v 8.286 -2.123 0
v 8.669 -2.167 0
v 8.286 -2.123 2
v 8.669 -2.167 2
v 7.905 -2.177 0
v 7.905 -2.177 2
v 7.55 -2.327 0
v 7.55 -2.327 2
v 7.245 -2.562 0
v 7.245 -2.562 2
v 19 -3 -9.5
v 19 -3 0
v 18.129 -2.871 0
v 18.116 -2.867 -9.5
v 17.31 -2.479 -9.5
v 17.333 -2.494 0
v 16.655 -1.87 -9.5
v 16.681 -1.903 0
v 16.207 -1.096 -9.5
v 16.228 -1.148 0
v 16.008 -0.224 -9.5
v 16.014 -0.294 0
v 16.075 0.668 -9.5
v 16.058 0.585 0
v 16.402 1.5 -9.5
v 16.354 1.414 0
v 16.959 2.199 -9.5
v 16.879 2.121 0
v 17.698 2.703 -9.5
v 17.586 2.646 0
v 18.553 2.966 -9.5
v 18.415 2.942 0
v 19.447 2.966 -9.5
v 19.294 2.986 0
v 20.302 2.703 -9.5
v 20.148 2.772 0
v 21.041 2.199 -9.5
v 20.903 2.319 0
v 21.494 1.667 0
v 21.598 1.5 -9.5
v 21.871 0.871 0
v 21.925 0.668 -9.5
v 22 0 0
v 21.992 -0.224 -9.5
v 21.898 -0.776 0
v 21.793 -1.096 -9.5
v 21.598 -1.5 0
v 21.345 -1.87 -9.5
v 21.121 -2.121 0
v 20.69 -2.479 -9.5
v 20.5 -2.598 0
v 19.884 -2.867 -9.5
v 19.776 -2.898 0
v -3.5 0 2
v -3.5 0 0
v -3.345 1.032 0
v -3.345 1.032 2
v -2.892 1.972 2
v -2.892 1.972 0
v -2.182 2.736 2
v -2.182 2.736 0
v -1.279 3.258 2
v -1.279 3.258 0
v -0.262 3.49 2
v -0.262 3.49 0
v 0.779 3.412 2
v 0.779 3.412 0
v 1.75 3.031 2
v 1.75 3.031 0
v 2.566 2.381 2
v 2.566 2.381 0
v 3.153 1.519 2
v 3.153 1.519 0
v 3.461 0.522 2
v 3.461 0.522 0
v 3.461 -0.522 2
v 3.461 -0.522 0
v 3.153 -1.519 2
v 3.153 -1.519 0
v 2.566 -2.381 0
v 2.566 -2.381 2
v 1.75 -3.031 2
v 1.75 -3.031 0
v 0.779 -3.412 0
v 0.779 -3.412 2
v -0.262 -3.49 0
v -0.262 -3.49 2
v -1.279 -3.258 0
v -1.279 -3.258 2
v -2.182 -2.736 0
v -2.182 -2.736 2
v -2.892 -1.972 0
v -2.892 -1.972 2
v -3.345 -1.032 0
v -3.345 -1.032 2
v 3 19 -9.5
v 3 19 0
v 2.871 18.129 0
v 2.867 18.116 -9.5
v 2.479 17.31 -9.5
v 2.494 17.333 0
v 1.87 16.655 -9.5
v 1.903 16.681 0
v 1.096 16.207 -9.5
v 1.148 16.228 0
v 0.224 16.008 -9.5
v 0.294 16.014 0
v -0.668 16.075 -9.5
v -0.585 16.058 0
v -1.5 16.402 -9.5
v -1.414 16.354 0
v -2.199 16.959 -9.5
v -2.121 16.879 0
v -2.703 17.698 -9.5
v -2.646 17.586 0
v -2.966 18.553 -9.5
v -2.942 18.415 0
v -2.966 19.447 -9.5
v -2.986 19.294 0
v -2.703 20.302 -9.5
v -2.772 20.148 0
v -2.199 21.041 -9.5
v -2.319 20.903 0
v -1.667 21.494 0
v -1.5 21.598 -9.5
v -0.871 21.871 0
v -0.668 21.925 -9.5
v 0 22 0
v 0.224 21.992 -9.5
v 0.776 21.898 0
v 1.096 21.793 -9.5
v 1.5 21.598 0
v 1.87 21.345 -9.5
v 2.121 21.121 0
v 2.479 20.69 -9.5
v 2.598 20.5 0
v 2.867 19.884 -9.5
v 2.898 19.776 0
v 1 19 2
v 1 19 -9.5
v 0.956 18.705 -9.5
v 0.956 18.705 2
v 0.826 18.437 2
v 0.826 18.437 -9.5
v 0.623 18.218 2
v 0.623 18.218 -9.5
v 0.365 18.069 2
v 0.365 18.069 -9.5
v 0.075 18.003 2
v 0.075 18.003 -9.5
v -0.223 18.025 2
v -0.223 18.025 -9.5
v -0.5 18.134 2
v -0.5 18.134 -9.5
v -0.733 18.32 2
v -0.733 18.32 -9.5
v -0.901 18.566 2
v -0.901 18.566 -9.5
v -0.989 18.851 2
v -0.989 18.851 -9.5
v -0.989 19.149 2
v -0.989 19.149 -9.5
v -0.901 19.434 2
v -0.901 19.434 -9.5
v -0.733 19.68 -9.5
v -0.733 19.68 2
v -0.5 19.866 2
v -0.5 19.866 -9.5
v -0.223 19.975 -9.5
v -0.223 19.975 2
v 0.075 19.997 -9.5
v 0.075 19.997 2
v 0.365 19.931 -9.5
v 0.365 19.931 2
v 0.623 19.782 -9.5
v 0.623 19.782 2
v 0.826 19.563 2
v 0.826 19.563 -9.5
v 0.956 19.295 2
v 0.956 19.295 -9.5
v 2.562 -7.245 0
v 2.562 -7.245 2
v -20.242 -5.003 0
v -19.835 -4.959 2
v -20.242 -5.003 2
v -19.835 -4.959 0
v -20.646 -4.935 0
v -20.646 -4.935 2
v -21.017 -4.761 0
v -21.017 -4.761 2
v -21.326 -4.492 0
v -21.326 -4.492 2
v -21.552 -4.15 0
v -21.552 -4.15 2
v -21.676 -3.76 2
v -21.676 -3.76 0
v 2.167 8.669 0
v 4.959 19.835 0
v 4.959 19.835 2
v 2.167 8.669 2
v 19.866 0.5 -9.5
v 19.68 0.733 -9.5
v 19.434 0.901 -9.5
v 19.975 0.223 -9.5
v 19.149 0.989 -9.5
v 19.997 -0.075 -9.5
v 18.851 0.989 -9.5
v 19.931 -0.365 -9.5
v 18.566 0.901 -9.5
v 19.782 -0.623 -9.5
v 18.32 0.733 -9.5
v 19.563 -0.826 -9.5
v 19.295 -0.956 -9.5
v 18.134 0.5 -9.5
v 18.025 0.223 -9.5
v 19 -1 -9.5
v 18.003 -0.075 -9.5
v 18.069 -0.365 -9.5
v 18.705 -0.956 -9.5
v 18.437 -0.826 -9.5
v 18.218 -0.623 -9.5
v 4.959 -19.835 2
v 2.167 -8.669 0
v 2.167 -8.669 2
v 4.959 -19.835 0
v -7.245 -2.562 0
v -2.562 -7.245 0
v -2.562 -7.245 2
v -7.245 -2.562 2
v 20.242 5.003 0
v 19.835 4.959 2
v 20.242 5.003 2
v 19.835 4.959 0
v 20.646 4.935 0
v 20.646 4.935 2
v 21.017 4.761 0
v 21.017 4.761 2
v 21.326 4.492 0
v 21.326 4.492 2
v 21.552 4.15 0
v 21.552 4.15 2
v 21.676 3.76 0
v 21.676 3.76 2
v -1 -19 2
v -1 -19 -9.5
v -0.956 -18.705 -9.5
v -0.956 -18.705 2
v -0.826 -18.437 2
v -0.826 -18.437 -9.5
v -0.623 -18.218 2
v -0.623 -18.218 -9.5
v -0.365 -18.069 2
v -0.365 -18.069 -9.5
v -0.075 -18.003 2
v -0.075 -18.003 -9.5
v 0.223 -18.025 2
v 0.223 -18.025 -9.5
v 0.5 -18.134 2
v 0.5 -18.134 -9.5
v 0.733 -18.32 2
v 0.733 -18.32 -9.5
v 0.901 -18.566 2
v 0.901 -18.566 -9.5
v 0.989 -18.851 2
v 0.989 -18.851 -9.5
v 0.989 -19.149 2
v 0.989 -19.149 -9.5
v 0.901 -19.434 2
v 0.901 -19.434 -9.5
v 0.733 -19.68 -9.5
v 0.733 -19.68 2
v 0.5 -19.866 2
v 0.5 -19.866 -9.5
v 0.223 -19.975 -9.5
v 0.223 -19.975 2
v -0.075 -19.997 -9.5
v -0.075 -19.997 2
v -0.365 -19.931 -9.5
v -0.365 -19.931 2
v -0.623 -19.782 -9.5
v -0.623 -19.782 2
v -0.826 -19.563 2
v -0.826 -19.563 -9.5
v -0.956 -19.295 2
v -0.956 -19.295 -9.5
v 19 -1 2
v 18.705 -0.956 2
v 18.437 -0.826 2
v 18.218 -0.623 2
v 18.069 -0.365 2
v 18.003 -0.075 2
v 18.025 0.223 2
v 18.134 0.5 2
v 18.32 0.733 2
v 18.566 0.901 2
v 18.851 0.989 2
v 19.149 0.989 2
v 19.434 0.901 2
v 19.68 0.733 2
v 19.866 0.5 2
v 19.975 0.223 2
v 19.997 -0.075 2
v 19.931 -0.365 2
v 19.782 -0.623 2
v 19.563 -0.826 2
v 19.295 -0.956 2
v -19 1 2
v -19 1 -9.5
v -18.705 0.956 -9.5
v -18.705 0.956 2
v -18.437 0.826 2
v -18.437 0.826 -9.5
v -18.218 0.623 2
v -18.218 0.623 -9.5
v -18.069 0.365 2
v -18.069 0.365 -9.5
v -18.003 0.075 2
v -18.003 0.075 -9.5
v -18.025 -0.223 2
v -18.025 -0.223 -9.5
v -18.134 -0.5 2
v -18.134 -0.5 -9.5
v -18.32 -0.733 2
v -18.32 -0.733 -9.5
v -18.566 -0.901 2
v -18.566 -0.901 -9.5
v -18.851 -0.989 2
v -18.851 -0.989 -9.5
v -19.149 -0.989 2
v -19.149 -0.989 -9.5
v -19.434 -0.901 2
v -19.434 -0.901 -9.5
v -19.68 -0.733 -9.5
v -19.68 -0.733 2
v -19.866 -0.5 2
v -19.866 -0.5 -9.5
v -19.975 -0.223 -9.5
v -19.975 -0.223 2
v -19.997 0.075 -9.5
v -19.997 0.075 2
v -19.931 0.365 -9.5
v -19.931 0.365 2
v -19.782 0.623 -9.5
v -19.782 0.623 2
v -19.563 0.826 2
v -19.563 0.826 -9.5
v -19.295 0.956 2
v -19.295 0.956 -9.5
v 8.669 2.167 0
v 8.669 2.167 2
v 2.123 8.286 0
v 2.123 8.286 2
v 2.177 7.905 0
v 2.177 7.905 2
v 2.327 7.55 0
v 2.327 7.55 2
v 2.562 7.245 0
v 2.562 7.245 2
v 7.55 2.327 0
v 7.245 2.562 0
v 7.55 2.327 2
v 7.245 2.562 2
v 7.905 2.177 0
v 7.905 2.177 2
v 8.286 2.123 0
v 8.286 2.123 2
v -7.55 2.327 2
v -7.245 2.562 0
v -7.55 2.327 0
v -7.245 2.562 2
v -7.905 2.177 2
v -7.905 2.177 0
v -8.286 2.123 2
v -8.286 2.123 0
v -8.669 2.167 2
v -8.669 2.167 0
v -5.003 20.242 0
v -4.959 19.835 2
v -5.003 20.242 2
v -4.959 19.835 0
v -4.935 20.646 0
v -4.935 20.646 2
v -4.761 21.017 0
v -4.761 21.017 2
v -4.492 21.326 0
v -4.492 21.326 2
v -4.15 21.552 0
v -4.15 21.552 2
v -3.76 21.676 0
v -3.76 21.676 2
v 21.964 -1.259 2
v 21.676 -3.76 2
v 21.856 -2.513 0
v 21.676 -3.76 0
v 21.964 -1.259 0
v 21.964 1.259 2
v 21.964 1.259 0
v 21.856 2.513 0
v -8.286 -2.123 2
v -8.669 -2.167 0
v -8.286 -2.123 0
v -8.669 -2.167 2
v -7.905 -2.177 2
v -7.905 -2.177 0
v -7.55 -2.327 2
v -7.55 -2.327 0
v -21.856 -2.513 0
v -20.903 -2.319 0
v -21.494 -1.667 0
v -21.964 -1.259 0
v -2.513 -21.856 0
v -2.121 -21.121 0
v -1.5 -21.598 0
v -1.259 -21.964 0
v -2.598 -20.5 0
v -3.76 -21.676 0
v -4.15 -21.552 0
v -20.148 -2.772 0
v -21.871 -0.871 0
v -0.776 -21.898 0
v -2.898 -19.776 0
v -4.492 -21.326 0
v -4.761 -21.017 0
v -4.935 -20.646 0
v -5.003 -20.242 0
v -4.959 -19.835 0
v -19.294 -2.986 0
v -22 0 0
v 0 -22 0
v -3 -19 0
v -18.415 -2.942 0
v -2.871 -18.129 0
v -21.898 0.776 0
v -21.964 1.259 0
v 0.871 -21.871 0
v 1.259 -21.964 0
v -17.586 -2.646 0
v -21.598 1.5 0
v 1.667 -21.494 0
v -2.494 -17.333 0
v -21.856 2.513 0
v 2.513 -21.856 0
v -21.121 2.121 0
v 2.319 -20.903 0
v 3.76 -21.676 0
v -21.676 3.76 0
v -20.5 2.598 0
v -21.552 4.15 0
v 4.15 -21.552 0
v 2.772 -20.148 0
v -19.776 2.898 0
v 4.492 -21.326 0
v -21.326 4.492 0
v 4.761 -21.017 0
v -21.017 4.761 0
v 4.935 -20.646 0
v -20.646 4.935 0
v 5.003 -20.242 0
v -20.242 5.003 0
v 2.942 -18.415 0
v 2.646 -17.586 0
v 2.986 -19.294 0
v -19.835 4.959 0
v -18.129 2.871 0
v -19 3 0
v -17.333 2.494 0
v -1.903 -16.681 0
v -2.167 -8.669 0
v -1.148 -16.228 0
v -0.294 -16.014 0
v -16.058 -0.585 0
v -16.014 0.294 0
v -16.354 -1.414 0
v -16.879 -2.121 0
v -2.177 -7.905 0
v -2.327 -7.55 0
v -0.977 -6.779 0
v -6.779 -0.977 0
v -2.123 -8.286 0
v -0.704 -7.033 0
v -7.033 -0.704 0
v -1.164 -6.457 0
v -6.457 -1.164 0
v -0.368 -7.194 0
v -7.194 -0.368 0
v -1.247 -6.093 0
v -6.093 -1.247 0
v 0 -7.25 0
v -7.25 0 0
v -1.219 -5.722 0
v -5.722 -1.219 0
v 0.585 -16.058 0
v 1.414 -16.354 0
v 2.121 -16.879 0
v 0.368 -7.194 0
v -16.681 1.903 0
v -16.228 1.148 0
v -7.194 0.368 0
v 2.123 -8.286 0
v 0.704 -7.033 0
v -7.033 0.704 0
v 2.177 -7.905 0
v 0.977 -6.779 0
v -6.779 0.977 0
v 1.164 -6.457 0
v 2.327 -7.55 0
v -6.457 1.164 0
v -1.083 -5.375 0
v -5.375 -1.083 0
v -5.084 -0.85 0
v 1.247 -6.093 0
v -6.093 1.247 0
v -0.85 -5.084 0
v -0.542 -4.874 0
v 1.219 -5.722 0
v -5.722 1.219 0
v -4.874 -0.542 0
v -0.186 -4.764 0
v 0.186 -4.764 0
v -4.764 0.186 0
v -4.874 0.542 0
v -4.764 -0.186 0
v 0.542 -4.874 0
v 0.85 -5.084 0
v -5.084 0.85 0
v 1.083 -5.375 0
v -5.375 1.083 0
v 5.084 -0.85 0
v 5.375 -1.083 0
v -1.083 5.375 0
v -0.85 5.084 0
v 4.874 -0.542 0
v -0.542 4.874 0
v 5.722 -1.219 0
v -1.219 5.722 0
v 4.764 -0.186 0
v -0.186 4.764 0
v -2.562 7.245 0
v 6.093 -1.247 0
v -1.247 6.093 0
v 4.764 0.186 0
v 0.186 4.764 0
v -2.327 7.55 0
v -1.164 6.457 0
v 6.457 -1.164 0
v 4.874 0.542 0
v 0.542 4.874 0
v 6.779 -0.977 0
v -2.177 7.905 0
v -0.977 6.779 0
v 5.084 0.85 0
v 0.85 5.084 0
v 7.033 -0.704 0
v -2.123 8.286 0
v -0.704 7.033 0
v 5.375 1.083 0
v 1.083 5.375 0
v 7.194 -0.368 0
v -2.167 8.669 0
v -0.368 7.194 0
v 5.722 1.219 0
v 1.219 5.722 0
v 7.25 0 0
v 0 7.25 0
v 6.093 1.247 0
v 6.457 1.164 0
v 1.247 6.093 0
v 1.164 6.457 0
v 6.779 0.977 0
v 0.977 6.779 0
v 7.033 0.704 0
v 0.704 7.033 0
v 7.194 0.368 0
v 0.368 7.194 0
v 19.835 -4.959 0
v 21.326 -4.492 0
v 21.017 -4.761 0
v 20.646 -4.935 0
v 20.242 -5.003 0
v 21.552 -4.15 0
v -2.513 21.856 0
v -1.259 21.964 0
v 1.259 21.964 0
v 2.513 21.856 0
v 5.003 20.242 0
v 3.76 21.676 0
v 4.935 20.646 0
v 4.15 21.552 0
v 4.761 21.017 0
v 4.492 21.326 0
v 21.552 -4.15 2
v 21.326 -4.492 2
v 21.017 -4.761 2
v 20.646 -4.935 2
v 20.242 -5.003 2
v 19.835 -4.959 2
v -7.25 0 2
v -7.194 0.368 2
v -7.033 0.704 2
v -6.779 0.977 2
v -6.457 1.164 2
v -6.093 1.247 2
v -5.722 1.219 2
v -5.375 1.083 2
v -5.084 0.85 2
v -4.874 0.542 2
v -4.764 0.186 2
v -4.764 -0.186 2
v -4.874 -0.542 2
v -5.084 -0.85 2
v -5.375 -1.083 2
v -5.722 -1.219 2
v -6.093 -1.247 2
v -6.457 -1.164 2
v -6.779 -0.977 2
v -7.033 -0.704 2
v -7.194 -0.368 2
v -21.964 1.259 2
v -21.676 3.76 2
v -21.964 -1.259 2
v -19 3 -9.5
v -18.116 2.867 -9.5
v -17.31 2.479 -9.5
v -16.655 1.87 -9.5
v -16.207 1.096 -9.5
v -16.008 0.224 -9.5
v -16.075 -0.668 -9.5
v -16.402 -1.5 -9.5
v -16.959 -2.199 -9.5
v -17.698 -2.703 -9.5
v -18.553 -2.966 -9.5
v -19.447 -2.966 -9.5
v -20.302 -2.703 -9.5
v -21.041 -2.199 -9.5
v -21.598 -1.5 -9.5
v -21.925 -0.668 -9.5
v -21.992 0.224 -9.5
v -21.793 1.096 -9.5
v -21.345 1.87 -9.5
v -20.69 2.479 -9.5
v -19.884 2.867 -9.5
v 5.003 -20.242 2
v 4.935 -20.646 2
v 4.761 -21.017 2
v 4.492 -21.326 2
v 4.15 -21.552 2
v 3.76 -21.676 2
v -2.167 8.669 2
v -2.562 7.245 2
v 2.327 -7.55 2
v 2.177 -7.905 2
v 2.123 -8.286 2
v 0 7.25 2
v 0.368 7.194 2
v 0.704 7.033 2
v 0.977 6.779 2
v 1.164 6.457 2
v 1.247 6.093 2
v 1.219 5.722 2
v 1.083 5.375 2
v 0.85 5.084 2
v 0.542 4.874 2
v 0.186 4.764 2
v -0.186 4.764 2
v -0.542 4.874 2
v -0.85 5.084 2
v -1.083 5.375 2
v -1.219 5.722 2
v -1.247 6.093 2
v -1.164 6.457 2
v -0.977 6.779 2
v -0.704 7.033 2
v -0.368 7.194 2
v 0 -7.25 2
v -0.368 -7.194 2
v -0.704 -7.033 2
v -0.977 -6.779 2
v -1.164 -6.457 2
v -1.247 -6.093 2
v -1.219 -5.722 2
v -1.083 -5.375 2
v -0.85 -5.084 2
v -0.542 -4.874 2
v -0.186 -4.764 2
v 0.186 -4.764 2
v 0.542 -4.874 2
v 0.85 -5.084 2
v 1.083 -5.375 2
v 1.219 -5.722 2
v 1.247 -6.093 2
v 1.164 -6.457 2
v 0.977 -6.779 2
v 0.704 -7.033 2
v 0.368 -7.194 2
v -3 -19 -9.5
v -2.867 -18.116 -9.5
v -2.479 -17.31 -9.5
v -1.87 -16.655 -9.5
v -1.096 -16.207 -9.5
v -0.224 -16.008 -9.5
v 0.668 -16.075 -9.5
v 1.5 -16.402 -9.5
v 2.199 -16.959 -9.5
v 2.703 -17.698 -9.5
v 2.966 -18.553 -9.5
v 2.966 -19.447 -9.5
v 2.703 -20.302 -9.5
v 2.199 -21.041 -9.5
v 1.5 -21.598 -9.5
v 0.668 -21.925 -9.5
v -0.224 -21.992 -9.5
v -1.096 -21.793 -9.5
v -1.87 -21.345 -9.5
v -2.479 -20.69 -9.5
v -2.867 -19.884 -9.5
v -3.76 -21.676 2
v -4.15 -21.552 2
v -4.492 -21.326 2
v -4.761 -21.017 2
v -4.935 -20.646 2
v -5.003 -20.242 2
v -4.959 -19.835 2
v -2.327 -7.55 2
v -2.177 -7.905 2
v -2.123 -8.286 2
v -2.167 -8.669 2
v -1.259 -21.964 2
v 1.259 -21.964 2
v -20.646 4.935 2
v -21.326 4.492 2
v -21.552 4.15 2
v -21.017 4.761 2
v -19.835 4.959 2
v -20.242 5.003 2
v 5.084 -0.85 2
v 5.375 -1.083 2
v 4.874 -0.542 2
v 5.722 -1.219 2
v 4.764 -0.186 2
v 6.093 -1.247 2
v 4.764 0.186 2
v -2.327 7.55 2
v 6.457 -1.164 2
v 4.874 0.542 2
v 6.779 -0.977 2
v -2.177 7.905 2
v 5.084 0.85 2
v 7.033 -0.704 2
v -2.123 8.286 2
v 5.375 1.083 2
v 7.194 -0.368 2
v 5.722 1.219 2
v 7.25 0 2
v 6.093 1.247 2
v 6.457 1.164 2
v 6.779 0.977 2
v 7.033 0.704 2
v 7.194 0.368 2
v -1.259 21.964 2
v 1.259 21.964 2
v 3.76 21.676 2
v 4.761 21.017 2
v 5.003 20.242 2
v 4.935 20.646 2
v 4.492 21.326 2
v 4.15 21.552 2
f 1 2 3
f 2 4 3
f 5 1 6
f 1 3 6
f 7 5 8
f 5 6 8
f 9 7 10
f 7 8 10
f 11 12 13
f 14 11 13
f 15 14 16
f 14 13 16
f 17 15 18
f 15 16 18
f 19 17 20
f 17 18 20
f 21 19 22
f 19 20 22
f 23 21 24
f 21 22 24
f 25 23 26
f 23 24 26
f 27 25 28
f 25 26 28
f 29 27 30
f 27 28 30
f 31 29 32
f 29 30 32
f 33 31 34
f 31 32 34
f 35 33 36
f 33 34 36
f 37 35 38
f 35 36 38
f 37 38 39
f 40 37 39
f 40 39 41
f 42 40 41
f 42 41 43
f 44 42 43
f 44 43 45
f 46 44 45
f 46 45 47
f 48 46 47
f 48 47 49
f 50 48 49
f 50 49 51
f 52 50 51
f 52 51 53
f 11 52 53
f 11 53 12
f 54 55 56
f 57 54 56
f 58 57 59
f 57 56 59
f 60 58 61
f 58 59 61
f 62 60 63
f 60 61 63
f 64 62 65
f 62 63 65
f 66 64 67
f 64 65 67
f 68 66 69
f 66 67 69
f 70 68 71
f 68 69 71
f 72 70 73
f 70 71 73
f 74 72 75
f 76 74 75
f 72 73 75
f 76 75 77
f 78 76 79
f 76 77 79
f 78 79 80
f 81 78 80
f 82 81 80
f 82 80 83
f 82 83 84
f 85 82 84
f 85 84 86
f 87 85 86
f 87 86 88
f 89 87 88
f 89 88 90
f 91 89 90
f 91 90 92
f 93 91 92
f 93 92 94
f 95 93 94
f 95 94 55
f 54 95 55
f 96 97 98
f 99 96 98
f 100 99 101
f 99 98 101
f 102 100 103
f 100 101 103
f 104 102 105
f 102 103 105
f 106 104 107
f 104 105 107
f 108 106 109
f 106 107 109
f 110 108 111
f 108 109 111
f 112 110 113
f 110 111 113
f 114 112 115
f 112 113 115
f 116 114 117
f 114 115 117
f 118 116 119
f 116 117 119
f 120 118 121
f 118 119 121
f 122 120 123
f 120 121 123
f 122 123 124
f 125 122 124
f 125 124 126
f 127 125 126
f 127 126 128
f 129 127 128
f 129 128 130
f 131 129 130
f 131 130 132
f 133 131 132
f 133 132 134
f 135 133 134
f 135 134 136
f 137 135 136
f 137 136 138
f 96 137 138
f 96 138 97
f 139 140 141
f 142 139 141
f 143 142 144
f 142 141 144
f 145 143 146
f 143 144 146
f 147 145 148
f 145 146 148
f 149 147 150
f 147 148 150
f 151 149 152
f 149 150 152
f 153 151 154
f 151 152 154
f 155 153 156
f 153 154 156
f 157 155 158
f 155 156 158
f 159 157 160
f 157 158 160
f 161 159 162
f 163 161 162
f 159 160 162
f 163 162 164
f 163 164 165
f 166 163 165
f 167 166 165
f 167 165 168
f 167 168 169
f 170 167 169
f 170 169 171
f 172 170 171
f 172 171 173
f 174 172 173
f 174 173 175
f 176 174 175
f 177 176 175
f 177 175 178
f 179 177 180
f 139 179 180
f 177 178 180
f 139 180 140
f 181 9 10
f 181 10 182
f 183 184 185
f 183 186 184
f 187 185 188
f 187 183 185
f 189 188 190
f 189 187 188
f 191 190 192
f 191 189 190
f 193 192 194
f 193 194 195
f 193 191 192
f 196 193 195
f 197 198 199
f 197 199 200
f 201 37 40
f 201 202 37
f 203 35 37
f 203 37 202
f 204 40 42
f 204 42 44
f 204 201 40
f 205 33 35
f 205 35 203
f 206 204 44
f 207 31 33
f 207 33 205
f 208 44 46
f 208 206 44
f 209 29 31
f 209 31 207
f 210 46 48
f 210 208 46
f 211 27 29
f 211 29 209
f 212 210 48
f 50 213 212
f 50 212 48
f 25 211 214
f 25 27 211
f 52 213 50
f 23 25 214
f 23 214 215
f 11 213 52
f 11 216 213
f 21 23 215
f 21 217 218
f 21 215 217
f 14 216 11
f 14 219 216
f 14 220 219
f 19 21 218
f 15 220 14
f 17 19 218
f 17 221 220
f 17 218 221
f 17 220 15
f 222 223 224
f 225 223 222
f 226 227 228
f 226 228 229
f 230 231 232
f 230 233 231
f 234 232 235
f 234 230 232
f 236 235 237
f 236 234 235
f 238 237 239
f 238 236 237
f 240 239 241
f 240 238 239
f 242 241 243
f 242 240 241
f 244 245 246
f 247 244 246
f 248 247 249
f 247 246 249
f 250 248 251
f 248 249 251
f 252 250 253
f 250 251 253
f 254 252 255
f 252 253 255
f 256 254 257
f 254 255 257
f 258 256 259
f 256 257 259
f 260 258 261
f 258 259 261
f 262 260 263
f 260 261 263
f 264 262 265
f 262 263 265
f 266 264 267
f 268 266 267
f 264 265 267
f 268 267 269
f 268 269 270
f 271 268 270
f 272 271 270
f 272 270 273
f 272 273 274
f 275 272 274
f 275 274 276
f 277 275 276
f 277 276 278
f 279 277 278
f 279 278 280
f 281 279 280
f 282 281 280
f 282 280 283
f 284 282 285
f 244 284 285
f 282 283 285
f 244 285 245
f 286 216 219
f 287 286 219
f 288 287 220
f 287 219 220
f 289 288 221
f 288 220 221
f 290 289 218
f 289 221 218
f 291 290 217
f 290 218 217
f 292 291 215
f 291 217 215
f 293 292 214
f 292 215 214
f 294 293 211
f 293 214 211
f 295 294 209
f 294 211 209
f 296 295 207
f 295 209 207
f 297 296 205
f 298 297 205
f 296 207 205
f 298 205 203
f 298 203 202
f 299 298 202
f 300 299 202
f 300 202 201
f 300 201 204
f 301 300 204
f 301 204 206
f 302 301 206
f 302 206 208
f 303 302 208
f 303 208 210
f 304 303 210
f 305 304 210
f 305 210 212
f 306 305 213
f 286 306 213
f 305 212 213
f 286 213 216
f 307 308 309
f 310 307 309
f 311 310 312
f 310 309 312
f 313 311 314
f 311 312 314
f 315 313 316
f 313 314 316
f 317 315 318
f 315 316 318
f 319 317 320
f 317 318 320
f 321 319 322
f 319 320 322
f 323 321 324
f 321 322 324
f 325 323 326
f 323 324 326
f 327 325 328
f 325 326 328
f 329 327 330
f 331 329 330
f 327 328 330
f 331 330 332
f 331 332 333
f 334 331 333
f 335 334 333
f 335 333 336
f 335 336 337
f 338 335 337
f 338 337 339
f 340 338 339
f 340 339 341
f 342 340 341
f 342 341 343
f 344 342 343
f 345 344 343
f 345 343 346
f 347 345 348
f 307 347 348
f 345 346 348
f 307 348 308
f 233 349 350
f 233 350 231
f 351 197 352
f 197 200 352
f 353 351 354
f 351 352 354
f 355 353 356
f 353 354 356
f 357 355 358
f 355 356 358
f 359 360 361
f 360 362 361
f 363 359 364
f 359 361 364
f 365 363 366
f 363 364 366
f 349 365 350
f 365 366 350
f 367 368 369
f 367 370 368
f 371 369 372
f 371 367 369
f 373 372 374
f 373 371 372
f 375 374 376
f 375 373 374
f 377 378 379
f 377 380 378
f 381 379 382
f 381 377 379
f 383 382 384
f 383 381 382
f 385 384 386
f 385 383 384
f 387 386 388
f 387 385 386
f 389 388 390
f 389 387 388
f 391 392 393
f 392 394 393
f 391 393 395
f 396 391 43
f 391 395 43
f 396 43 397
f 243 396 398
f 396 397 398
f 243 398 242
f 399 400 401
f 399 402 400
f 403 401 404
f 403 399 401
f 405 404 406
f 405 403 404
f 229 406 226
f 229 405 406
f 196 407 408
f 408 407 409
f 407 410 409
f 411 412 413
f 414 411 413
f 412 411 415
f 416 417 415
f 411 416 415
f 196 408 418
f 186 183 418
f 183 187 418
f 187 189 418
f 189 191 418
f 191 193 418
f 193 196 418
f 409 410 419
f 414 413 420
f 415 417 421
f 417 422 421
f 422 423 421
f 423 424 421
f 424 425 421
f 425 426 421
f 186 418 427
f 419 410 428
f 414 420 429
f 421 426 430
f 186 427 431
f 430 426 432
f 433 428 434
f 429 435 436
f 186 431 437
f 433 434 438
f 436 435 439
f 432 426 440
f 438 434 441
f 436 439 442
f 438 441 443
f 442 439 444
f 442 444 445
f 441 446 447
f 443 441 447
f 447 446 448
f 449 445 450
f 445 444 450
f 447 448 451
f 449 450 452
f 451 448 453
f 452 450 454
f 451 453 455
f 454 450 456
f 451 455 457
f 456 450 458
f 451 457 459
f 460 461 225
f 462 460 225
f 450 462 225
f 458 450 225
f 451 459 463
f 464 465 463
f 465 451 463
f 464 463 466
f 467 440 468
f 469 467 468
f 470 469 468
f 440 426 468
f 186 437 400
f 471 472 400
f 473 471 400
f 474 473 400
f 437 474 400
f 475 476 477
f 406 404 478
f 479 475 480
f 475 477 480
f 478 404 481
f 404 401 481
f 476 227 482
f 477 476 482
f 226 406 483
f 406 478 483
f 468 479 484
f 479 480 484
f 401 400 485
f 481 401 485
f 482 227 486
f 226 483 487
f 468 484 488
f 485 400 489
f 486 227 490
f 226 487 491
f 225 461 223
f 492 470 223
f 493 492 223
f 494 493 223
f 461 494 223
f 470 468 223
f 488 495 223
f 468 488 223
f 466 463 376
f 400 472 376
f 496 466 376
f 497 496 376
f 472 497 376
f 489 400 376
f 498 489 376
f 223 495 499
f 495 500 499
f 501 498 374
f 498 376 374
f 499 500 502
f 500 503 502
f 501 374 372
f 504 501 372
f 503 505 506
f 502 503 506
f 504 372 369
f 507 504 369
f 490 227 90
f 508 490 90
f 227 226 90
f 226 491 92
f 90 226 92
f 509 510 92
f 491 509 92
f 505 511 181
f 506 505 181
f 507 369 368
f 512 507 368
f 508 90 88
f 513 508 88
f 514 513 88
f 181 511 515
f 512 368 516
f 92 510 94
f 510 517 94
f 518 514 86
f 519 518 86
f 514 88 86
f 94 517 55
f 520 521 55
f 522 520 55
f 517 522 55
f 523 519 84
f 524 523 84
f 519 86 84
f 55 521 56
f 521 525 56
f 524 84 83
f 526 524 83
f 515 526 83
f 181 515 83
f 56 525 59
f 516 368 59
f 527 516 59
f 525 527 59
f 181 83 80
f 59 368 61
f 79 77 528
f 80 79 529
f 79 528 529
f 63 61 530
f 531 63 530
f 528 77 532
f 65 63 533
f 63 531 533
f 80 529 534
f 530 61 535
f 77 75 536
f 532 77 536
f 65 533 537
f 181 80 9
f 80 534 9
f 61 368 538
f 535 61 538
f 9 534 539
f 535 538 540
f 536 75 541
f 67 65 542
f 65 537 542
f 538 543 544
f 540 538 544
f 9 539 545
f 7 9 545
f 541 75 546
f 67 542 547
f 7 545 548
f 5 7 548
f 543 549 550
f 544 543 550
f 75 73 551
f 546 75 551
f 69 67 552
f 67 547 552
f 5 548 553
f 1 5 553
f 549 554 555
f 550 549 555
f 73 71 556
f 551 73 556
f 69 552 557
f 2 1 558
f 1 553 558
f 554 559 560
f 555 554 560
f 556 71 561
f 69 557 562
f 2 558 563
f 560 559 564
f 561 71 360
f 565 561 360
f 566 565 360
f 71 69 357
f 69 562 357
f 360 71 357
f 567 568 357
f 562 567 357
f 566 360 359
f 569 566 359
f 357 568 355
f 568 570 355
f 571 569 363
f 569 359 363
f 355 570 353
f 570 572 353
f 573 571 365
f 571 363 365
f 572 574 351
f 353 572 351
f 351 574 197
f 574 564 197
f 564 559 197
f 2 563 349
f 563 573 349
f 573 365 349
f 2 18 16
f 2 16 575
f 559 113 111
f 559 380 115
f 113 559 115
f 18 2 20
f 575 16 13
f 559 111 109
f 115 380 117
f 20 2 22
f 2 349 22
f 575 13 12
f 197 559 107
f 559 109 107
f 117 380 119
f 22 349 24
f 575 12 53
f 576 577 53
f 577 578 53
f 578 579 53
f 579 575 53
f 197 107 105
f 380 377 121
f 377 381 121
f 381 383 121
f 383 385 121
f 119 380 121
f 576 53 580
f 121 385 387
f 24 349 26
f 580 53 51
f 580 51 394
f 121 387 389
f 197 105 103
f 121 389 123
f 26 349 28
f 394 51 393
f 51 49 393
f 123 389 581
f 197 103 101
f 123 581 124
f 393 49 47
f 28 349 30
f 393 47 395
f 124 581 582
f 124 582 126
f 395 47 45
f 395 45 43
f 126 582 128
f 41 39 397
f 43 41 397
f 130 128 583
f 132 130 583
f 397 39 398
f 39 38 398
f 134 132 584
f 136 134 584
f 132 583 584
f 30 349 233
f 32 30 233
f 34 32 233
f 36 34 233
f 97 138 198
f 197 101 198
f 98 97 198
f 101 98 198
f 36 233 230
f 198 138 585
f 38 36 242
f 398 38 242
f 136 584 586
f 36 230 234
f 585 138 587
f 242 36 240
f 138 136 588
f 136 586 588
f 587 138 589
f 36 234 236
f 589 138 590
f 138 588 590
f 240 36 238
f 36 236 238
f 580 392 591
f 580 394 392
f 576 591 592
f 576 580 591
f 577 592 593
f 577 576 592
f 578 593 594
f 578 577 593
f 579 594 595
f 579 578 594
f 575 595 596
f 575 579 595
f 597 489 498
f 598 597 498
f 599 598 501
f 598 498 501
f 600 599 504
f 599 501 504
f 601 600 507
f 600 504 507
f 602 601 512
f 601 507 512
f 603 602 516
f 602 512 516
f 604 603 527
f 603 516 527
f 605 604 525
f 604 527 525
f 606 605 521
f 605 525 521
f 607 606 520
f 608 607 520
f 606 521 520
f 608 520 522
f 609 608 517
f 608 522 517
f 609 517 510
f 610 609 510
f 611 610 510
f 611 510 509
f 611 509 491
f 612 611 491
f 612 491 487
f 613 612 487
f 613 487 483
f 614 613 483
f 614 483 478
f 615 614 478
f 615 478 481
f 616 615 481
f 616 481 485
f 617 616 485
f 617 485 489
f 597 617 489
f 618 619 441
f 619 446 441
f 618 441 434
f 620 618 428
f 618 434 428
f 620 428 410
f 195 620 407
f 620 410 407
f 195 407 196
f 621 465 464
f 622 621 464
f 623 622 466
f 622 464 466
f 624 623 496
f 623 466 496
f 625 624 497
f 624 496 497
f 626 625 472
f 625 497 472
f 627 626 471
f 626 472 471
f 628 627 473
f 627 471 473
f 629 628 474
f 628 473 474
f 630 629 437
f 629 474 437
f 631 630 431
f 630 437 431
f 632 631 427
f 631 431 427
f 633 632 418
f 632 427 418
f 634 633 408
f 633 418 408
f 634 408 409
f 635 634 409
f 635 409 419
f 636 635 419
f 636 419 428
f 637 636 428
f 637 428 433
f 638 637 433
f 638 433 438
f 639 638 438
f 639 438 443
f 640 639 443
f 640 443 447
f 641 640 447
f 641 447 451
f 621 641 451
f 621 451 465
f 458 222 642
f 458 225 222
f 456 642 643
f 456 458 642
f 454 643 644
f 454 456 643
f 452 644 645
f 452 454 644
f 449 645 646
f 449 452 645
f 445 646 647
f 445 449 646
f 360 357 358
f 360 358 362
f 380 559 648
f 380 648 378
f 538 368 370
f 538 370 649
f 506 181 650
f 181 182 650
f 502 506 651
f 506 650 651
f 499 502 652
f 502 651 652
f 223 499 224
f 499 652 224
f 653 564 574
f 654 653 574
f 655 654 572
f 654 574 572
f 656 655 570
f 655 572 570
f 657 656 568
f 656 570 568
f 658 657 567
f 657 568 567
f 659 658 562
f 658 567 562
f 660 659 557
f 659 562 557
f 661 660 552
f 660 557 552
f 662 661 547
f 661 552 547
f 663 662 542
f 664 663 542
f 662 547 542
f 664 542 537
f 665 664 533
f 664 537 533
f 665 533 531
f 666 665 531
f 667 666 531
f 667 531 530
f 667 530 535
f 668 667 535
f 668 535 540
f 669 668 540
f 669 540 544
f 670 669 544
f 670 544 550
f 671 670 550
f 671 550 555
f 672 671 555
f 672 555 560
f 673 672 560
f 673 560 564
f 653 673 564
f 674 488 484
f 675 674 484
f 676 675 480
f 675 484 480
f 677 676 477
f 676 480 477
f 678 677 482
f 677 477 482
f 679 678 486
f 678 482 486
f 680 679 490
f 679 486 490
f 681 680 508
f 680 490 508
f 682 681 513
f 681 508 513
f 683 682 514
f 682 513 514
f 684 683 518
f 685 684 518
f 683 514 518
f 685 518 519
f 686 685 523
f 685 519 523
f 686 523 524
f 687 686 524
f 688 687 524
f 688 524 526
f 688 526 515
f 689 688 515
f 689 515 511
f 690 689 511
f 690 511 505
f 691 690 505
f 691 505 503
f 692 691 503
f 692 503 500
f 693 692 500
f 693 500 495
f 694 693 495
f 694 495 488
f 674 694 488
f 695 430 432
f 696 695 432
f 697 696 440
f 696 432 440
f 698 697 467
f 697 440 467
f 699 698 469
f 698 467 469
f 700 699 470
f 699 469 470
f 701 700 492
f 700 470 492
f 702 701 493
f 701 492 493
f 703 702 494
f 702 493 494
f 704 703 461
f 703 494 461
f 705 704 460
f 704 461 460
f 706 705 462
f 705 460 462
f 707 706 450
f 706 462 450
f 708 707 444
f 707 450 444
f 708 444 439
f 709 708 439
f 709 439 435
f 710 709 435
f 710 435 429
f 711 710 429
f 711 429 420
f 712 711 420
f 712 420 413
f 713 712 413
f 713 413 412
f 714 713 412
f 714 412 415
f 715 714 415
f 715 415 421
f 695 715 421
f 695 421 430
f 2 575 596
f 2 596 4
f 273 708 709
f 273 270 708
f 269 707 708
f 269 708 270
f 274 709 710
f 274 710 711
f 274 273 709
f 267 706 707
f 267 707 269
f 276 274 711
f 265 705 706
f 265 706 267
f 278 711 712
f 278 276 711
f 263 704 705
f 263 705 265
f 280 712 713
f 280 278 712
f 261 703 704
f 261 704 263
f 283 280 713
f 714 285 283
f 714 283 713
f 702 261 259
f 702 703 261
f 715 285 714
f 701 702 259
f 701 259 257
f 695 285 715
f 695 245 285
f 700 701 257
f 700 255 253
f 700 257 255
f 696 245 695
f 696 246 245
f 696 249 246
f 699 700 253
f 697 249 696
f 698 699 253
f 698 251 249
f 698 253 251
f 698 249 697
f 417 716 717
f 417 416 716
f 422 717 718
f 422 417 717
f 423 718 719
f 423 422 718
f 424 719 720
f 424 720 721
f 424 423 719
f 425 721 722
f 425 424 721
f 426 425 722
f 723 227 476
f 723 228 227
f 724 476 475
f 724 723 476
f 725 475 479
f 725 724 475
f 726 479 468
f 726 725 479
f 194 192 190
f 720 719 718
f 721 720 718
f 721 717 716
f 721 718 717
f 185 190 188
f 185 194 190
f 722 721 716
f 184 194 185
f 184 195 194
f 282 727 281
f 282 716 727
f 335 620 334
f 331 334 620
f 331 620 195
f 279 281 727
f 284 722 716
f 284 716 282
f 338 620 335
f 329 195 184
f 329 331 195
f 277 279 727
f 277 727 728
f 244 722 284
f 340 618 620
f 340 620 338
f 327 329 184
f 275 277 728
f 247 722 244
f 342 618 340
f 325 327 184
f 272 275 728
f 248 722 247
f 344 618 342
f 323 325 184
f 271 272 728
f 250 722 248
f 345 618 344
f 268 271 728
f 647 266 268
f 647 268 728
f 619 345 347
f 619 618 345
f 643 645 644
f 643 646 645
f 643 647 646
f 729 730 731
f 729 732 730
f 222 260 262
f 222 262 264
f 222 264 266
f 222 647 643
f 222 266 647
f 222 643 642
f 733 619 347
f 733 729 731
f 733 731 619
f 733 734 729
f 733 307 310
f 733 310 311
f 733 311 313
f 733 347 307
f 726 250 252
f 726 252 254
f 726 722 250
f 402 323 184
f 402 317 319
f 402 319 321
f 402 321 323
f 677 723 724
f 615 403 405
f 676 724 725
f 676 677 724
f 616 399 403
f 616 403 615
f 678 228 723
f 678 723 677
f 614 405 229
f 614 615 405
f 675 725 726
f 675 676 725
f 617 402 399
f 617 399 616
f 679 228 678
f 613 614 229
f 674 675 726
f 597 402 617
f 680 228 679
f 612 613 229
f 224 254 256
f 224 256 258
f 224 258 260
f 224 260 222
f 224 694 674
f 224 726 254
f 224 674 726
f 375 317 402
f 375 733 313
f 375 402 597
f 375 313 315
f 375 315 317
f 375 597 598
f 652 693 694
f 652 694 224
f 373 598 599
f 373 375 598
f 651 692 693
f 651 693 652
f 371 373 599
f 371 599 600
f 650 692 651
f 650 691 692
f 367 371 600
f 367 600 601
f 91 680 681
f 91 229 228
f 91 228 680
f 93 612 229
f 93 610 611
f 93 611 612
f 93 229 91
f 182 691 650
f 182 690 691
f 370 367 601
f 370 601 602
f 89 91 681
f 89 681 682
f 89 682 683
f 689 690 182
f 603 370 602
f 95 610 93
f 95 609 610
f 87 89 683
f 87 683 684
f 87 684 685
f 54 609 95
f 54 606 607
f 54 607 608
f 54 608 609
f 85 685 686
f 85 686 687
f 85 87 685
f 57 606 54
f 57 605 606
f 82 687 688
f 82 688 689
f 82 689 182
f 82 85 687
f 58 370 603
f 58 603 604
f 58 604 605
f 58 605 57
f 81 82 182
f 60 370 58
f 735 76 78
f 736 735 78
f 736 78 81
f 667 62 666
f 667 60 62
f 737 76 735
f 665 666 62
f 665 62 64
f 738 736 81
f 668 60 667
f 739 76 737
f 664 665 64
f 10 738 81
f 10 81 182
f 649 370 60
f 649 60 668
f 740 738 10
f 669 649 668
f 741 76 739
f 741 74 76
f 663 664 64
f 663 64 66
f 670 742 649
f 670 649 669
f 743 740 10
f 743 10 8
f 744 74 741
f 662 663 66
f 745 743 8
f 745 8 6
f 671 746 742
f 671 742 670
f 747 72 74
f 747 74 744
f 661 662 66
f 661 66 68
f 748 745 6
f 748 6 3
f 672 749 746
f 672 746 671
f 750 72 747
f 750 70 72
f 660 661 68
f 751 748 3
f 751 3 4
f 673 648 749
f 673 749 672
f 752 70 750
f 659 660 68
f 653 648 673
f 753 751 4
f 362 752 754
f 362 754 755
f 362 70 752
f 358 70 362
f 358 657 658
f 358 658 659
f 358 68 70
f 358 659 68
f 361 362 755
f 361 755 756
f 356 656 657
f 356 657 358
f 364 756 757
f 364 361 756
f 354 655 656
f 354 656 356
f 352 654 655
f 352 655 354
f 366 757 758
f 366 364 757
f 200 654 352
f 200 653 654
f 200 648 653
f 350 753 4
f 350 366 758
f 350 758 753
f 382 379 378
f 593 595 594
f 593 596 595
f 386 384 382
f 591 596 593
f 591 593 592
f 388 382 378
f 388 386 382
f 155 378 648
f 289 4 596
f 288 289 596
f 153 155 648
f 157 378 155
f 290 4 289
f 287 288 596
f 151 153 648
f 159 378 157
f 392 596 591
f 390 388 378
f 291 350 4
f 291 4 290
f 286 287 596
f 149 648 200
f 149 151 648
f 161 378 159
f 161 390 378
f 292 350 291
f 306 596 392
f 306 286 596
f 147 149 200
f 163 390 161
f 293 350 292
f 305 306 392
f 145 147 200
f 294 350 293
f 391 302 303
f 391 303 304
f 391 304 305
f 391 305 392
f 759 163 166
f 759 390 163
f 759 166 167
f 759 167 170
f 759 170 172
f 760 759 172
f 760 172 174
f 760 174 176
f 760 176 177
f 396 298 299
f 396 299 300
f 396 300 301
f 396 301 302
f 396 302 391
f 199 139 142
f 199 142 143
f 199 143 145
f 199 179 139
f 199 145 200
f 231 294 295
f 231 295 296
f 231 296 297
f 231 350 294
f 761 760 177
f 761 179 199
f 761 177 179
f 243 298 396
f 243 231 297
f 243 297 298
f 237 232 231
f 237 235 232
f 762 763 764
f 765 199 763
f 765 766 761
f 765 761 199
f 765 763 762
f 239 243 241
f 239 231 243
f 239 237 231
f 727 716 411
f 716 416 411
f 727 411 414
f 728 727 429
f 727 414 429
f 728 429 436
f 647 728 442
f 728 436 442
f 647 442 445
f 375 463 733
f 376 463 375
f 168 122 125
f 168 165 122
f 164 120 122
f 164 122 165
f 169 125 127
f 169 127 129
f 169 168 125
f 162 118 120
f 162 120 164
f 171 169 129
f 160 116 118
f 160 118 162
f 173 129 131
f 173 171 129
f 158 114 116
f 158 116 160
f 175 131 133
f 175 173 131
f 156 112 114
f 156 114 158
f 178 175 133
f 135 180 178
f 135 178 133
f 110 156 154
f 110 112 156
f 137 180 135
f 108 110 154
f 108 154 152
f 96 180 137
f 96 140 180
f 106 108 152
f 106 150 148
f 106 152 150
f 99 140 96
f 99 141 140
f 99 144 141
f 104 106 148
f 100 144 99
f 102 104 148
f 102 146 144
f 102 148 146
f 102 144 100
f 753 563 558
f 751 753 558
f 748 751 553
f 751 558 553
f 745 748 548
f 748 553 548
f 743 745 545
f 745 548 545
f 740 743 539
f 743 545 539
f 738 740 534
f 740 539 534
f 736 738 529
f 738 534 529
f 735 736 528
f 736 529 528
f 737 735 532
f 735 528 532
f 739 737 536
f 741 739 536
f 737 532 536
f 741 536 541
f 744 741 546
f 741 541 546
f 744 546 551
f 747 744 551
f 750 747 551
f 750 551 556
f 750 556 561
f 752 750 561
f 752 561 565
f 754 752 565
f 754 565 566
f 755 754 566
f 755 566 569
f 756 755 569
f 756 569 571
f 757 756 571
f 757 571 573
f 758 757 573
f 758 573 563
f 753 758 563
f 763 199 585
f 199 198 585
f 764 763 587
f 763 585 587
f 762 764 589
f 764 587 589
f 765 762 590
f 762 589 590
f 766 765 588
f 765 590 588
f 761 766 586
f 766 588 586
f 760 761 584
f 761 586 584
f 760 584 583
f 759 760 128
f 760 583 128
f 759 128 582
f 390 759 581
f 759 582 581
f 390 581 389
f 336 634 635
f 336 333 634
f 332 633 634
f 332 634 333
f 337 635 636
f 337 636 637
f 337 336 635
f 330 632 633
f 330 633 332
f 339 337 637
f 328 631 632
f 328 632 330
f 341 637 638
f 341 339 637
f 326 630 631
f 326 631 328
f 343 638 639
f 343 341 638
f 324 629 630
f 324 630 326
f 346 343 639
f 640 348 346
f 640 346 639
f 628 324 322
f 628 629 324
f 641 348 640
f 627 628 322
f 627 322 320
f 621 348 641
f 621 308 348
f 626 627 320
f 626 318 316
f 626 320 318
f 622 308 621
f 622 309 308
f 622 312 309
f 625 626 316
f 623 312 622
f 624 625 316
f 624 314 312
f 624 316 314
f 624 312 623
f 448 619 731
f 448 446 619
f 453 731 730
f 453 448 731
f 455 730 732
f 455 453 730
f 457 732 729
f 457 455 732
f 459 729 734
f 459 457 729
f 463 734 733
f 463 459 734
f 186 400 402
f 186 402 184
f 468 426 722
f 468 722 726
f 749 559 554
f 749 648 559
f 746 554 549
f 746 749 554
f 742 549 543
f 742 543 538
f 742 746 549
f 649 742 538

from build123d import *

# Parameters (mm, degrees)
SKETCH_1_R               = 22
EXTRUDE_1_DEPTH          = 2
SKETCH_3_R               = 1.25
CUT_EXTRUDE_1_DEPTH      = 3
SKETCH_4_R               = 3.5
CUT_EXTRUDE_2_DEPTH      = 3
SKETCH_6_R               = 3
EXTRUDE_3_DEPTH          = 9.5
SKETCH_8_R               = 1
CUT_EXTRUDE_4_DEPTH      = 11.5
CUT_EXTRUDE_3_DEPTH      = 6
PATTERN_CIRCULAR_1_COUNT = 4
FILLET_2_R               = 1.5
FILLET_3_R               = 1.5


with BuildPart() as part:
    # 草图1 → 凸台-拉伸1 (new body)
    with BuildSketch(Plane.XY):
        Circle(SKETCH_1_R)
    extrude(amount=EXTRUDE_1_DEPTH)

    # 草图3 → 切除-拉伸1 (cut)
    with BuildSketch(Plane(origin=(0, 0, 0), x_dir=(-1, 0, 0), z_dir=(0, 0, -1))):
        with Locations((6, 0)):
            Circle(SKETCH_3_R)
    cut_extrude_1 = extrude(amount=-CUT_EXTRUDE_1_DEPTH, mode=Mode.SUBTRACT)

    # 草图4 → 切除-拉伸2 (cut)
    with BuildSketch(Plane(origin=(0, 0, 0), x_dir=(-1, 0, 0), z_dir=(0, 0, -1))):
        Circle(SKETCH_4_R)
    extrude(amount=-CUT_EXTRUDE_2_DEPTH, mode=Mode.SUBTRACT)

    # 草图6 → 凸台-拉伸3 (add)
    with BuildSketch(Plane(origin=(0, 0, 0), x_dir=(-1, 0, 0), z_dir=(0, 0, -1))):
        with Locations((0, -19)):
            Circle(SKETCH_6_R)
    extrude_3 = extrude(amount=EXTRUDE_3_DEPTH)

    # 草图8 → 切除-拉伸4 (cut)
    with BuildSketch(Plane(origin=(0, 0, -9.5), x_dir=(-1, 0, 0), z_dir=(0, 0, -1))):
        with Locations((0, -19)):
            Circle(SKETCH_8_R)
    cut_extrude_4 = extrude(amount=-CUT_EXTRUDE_4_DEPTH, mode=Mode.SUBTRACT)

    # 草图7 → 切除-拉伸3 (cut)
    with BuildSketch(Plane(origin=(0, 0, 0), x_dir=(-1, 0, 0), z_dir=(0, 0, -1))):
        Polygon((-1.961261338, 7.845045353), (-7.845045353, 1.961261338), (-30.512752563, 7.628188141), (-7.628188141, 30.512752563), align=None)
    cut_extrude_3 = extrude(amount=-CUT_EXTRUDE_3_DEPTH, mode=Mode.SUBTRACT)

    # 阵列(圆周)1: 切除-拉伸1, 凸台-拉伸3, 切除-拉伸4, 切除-拉伸3 ×4 about axis
    pattern_circular_1_axis = Axis((0, 0, 0), (0, 0, 1))
    for i in range(1, PATTERN_CIRCULAR_1_COUNT):
        add(cut_extrude_1.rotate(pattern_circular_1_axis, i * 360 / PATTERN_CIRCULAR_1_COUNT), mode=Mode.SUBTRACT)
        add(extrude_3.rotate(pattern_circular_1_axis, i * 360 / PATTERN_CIRCULAR_1_COUNT))
        add(cut_extrude_4.rotate(pattern_circular_1_axis, i * 360 / PATTERN_CIRCULAR_1_COUNT), mode=Mode.SUBTRACT)
        add(cut_extrude_3.rotate(pattern_circular_1_axis, i * 360 / PATTERN_CIRCULAR_1_COUNT), mode=Mode.SUBTRACT)

    # 圆角2
    fillet_2_edges = [part.edges().sort_by_distance(p)[0] for p in [
        (-5.335783751, -21.343135003, 1),
        (-21.343135003, -5.335783751, 1),
        (21.343135003, -5.335783751, 1),
        (5.335783751, -21.343135003, 1),
        (5.335783751, 21.343135003, 1),
        (21.343135003, 5.335783751, 1),
        (-21.343135003, 5.335783751, 1),
        (-5.335783751, 21.343135003, 1),
    ]]
    fillet(fillet_2_edges, radius=FILLET_2_R)

    # 圆角3
    fillet_3_edges = [part.edges().sort_by_distance(p)[0] for p in [
        (-7.845045353, -1.961261338, 1),
        (-1.961261338, -7.845045353, 1),
        (1.961261338, -7.845045353, 1),
        (7.845045353, -1.961261338, 1),
        (7.845045353, 1.961261338, 1),
        (1.961261338, 7.845045353, 1),
        (-1.961261338, 7.845045353, 1),
        (-7.845045353, 1.961261338, 1),
    ]]
    fillet(fillet_3_edges, radius=FILLET_3_R)


solid = part.part
